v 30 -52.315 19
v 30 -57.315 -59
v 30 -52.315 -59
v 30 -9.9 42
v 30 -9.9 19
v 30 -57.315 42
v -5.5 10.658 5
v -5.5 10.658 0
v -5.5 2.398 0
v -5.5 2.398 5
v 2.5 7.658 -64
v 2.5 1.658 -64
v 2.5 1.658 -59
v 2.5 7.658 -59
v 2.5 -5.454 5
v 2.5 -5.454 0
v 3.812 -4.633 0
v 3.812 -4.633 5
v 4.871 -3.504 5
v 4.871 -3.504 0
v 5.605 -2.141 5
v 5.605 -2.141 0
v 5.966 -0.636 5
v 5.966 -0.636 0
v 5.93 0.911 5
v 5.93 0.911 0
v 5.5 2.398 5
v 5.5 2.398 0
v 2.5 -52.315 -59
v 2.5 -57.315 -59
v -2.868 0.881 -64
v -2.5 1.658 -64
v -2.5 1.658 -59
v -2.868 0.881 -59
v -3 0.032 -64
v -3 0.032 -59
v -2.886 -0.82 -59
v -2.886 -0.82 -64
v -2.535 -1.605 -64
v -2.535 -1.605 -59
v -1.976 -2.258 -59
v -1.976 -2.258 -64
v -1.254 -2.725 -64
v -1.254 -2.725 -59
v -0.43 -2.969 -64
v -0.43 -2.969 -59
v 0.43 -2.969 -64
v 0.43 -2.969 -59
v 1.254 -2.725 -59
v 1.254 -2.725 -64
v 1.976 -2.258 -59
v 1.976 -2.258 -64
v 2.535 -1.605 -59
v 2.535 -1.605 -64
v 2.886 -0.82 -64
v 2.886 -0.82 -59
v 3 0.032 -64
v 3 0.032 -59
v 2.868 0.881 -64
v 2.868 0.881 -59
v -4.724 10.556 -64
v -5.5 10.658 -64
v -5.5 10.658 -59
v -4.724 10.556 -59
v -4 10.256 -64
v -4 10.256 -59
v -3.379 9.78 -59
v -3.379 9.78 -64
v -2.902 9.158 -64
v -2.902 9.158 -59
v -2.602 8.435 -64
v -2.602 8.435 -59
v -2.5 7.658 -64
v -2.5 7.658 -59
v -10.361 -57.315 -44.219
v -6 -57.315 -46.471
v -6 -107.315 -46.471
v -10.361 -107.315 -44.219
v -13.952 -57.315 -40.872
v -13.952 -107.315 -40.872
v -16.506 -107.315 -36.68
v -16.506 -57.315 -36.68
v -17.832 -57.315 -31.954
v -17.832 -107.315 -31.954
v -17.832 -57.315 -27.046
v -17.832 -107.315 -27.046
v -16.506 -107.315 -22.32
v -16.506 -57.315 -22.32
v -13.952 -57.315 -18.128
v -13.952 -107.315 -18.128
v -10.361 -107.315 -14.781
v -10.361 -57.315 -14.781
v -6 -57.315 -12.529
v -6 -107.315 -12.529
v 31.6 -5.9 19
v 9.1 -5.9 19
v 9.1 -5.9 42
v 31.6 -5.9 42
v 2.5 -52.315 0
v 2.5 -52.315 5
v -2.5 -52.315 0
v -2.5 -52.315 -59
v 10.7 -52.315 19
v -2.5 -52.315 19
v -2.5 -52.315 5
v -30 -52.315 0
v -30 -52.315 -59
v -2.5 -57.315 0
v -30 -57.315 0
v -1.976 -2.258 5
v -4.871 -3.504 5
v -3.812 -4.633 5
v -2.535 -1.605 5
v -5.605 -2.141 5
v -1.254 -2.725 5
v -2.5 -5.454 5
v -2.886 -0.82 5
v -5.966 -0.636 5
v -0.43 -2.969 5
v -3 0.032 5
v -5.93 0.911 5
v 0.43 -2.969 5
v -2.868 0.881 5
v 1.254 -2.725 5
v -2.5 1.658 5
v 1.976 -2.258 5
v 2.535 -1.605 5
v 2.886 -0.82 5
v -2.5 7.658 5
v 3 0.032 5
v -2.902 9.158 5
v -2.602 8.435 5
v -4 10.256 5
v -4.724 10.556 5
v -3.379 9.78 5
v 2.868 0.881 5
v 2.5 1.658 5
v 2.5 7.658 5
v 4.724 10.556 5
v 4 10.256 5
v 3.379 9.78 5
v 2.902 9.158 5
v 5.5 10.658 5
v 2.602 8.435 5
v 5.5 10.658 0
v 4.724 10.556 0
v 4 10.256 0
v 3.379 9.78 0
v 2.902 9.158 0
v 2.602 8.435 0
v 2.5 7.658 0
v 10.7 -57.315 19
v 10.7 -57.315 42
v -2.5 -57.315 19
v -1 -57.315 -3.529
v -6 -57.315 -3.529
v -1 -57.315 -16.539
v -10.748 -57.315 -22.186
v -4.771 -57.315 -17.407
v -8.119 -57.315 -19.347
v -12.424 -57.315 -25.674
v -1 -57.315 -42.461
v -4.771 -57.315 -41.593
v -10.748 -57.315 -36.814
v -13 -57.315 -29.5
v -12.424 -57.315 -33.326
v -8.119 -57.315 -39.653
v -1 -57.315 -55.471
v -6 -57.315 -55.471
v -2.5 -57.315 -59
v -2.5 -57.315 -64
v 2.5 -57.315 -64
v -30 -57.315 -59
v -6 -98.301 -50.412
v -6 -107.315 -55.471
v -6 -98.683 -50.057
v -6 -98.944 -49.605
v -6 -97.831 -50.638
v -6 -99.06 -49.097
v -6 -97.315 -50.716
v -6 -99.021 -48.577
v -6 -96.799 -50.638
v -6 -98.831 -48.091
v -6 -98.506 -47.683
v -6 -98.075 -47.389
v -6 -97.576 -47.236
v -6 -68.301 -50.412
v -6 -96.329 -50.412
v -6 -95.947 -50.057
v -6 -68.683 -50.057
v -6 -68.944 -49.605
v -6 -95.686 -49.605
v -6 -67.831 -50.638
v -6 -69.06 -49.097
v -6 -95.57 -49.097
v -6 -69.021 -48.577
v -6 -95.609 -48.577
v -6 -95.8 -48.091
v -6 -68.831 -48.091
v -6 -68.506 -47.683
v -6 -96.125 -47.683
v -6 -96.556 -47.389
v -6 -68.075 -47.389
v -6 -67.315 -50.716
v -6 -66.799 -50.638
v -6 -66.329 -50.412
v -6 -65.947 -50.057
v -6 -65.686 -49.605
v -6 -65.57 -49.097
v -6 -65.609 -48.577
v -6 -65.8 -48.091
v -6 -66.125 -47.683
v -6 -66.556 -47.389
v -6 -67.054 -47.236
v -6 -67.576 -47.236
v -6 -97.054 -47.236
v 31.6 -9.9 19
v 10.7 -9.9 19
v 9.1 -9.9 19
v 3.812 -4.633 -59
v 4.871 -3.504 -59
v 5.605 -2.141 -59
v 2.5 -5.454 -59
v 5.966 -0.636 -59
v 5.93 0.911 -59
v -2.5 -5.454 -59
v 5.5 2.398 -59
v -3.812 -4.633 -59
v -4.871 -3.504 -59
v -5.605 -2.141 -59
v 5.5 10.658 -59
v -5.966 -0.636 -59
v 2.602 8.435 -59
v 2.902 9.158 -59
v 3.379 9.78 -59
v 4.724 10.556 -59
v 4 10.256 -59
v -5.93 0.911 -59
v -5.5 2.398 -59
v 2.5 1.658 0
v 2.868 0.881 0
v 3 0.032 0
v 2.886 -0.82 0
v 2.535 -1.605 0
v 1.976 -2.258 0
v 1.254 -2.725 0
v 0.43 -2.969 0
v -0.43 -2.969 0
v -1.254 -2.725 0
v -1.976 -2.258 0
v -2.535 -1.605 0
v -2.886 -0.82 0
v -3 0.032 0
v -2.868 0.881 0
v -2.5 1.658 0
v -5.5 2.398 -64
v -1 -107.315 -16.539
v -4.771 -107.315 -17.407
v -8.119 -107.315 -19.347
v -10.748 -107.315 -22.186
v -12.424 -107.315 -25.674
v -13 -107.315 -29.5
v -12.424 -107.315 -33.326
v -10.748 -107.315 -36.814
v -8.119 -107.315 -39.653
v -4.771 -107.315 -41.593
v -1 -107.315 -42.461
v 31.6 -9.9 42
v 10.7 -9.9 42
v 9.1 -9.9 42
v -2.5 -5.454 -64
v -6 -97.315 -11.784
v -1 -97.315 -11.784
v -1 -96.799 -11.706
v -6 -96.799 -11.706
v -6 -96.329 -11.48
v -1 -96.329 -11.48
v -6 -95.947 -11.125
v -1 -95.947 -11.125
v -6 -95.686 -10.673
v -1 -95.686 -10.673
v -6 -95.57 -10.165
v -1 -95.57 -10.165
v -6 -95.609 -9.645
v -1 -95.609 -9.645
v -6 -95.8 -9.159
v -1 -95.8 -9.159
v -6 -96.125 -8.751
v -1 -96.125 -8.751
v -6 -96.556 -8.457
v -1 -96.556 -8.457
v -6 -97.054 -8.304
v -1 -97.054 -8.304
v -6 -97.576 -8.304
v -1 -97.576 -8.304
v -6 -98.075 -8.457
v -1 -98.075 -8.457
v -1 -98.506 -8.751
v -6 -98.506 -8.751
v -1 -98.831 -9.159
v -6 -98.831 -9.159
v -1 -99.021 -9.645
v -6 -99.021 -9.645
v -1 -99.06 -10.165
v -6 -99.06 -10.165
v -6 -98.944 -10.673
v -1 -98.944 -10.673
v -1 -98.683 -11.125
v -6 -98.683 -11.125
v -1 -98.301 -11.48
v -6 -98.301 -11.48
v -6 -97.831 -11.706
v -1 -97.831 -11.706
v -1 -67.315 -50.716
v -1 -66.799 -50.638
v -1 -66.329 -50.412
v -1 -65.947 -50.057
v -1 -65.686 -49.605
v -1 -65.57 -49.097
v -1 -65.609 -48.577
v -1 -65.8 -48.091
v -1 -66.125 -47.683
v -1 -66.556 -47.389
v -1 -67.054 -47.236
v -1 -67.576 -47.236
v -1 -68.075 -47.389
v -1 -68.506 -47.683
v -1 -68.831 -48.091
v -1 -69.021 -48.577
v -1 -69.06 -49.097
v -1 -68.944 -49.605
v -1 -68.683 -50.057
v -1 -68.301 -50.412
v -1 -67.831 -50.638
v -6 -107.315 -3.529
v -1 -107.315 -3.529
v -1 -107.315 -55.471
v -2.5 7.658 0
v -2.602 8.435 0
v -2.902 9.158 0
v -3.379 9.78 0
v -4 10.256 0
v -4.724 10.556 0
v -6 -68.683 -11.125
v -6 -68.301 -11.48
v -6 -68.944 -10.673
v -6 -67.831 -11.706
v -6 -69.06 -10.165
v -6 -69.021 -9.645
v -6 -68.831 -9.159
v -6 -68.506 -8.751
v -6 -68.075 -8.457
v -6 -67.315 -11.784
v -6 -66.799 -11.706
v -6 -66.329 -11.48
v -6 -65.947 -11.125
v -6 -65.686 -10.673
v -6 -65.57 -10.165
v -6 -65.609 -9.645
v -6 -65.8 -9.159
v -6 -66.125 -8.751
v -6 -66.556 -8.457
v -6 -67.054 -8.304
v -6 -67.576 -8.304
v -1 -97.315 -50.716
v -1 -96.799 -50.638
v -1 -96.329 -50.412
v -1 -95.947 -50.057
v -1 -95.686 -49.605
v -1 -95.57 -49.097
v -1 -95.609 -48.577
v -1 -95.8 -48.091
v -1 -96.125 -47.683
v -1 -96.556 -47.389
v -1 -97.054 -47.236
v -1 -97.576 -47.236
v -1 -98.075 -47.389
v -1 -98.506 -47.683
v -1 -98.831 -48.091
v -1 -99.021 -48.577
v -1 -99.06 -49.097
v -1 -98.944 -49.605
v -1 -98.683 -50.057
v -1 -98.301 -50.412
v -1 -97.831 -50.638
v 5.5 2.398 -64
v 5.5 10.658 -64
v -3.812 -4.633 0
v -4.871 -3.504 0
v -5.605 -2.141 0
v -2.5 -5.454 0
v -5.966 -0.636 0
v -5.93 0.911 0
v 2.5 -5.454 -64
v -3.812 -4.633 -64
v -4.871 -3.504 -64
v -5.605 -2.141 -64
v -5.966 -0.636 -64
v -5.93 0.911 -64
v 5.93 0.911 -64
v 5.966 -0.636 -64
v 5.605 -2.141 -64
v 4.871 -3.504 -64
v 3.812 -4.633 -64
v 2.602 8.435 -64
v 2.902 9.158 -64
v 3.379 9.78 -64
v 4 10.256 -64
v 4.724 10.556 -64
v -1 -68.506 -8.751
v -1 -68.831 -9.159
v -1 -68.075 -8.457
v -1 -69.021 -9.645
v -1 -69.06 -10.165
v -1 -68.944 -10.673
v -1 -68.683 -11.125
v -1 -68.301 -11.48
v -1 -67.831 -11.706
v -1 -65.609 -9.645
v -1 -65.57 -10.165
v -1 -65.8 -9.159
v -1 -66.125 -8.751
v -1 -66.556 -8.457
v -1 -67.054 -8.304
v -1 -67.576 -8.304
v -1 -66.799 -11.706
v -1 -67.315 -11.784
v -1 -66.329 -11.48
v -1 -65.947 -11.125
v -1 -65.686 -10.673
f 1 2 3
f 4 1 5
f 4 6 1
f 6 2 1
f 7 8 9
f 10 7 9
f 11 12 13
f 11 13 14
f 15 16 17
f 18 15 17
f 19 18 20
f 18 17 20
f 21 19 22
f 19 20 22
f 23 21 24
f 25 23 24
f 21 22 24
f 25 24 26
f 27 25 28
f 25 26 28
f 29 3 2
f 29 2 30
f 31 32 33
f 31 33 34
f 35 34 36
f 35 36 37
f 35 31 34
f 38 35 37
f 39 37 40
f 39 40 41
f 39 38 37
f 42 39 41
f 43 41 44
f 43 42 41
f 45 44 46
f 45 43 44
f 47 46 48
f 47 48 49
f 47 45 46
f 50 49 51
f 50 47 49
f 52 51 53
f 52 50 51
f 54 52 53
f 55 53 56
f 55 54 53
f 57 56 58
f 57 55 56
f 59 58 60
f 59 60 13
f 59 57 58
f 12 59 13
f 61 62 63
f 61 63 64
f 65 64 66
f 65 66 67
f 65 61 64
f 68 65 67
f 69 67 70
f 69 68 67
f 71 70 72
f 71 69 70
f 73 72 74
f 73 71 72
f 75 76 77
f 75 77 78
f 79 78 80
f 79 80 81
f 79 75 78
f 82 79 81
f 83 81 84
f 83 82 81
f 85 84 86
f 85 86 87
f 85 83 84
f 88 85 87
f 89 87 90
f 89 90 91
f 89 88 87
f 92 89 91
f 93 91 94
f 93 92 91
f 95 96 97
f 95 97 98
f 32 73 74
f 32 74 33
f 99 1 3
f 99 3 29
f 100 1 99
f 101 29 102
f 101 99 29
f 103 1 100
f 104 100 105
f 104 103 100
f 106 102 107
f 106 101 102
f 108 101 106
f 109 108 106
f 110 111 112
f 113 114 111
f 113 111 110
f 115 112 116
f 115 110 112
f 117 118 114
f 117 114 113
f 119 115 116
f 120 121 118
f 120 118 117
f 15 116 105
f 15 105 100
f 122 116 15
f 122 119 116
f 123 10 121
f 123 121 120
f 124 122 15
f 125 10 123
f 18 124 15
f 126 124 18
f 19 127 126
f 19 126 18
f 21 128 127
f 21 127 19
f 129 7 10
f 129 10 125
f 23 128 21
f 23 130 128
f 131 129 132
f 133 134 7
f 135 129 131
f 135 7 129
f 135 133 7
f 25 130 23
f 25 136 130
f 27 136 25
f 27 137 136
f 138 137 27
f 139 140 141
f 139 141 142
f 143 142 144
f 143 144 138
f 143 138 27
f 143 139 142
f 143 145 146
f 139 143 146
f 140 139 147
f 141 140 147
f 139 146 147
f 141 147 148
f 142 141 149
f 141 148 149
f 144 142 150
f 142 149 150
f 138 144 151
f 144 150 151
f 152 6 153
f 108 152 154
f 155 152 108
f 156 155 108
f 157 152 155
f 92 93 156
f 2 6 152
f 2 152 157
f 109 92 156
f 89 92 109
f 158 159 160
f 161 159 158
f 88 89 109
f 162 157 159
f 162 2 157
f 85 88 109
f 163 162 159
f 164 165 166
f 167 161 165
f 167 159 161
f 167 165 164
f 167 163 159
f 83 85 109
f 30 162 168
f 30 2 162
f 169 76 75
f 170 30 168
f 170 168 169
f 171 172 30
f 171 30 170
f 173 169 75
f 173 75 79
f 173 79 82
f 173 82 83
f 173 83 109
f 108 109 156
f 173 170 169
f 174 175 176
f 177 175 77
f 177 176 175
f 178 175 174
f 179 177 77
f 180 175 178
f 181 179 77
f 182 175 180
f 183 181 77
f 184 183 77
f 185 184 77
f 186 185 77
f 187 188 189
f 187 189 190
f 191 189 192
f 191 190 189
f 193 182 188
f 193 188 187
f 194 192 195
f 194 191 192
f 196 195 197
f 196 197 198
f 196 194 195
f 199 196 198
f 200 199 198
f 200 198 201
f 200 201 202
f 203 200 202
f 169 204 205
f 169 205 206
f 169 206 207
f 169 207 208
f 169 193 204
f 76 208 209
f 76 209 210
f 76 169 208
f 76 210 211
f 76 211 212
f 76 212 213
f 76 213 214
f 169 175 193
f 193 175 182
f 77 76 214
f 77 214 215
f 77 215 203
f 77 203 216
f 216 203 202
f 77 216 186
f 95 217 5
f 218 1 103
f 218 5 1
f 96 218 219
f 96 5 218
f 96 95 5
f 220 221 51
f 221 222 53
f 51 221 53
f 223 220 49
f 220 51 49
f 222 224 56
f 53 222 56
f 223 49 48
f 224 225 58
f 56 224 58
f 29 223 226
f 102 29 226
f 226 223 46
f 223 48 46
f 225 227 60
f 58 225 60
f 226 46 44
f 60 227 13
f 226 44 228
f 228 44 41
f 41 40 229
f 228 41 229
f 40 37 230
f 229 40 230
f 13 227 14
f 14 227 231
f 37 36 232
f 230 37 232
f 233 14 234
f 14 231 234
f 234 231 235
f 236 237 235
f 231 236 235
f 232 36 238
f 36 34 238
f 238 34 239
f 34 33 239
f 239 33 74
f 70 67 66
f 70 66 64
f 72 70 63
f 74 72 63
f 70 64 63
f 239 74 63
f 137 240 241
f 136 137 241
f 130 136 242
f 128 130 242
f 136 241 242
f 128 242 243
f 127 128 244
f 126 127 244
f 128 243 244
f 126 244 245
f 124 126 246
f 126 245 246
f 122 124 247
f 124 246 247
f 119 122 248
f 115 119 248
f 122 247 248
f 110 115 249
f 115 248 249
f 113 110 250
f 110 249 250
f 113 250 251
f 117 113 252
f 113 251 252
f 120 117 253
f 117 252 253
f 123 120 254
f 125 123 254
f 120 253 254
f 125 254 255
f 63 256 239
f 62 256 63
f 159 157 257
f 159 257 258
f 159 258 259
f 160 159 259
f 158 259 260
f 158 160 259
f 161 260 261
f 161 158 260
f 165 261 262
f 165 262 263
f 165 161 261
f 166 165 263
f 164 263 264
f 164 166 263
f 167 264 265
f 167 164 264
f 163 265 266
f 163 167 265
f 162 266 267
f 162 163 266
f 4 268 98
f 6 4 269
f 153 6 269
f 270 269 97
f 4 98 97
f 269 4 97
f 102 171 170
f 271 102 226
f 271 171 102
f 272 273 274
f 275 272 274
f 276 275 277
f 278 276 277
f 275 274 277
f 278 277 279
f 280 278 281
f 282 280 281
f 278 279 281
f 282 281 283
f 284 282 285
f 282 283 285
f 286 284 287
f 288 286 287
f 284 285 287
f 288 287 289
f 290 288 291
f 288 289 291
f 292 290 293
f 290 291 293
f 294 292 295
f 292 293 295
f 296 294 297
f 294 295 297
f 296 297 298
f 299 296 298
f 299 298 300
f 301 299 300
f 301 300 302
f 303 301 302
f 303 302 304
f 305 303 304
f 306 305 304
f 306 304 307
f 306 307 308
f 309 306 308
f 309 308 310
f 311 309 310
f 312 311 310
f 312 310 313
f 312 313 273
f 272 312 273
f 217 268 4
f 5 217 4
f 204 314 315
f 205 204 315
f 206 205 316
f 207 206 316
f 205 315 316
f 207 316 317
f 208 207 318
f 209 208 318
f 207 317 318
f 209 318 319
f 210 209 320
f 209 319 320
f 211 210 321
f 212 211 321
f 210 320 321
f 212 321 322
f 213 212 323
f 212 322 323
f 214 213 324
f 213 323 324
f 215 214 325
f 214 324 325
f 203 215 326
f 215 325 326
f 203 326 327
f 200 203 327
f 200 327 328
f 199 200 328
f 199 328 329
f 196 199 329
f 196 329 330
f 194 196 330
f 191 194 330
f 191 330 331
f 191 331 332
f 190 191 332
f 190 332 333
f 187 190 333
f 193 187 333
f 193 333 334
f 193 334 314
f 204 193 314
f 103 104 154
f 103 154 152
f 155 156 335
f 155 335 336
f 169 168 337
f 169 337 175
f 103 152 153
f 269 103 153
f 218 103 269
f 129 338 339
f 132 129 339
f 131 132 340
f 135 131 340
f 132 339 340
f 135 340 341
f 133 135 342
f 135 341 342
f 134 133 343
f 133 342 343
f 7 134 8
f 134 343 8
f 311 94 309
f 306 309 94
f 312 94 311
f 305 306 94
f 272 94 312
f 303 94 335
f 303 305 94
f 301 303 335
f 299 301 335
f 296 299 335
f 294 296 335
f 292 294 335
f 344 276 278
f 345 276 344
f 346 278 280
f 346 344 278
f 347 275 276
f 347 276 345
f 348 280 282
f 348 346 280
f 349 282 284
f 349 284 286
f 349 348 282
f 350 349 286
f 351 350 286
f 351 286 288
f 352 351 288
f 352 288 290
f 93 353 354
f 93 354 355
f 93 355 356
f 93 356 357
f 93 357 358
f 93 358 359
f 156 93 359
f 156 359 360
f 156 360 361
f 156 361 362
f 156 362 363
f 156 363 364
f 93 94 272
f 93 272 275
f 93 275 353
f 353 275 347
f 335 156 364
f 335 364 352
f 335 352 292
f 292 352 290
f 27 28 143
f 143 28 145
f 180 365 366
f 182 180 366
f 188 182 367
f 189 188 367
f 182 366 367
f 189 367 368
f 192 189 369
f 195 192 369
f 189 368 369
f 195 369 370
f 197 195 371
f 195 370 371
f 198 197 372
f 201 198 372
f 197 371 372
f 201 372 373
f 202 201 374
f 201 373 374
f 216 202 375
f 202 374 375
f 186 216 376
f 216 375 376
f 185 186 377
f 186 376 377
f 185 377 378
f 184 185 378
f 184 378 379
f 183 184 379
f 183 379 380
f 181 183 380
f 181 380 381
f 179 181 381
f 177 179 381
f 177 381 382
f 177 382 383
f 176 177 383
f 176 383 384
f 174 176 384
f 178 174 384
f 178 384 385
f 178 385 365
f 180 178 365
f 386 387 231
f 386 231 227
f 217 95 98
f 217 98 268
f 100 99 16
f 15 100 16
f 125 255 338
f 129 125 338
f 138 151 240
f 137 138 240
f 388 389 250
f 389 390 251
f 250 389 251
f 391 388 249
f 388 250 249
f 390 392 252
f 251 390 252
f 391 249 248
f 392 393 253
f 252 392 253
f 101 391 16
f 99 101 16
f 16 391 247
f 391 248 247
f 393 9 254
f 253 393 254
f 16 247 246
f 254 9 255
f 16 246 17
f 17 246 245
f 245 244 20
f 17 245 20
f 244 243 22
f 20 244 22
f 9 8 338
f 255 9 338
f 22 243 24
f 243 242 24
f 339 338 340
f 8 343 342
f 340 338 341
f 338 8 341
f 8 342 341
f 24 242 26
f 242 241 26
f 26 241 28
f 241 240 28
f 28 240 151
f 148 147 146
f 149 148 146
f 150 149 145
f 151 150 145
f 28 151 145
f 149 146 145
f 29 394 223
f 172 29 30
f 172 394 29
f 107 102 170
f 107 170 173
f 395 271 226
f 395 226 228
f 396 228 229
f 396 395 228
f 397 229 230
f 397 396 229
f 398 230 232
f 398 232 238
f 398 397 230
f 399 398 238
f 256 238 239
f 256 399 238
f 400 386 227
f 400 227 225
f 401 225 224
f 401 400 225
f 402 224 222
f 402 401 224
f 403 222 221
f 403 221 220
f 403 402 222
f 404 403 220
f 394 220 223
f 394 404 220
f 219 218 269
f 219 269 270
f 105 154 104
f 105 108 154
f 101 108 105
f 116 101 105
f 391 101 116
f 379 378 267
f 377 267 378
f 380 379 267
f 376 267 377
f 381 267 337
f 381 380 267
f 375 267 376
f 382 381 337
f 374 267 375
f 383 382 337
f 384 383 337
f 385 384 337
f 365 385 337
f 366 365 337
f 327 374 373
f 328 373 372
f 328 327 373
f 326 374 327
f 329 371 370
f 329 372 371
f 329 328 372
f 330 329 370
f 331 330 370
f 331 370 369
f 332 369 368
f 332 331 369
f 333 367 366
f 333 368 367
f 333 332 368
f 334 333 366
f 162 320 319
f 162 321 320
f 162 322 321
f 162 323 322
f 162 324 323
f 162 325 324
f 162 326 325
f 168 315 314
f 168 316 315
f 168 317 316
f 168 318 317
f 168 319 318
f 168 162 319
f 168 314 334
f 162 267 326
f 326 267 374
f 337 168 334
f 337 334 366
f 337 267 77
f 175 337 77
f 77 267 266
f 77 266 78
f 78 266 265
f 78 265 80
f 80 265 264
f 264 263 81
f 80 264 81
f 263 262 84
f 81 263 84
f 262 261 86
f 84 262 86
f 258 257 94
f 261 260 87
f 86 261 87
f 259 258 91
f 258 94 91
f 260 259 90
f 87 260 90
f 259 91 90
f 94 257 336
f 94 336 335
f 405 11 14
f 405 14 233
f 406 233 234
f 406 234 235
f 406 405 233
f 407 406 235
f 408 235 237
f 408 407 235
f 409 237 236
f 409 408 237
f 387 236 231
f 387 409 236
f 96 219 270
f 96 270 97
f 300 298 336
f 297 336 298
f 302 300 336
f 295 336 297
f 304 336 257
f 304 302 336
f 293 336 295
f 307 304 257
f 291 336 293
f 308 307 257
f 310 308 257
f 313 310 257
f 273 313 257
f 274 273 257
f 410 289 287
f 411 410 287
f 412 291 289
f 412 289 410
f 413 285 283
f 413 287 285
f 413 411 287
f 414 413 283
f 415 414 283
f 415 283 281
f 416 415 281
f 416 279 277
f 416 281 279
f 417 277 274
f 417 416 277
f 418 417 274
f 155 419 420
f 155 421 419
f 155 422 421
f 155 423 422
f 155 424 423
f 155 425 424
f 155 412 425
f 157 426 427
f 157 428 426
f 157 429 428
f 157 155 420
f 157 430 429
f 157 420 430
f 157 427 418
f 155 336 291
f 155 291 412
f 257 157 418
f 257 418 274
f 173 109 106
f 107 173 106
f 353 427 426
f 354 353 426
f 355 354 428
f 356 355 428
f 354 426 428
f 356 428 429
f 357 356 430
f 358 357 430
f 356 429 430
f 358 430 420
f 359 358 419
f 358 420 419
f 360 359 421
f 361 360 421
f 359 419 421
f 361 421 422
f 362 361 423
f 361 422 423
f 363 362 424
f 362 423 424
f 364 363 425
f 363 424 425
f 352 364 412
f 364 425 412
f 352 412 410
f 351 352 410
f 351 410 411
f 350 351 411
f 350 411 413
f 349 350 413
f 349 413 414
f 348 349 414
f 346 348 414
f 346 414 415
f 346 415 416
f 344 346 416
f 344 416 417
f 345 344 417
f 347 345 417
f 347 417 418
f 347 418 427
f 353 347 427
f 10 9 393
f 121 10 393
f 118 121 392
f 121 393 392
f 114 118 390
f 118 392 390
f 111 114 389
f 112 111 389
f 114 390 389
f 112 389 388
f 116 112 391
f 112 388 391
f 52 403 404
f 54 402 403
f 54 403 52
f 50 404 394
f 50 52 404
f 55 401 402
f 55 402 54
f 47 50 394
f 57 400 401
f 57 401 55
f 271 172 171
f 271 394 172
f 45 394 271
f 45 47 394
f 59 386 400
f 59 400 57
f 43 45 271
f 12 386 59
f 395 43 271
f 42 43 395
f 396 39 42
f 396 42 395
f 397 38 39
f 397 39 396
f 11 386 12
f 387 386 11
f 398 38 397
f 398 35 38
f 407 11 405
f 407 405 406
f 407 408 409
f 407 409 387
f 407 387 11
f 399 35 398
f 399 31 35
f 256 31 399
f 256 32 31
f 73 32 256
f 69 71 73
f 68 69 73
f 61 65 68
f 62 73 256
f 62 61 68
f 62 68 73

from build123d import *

# Parameters (mm, degrees)
BOSS_EXTRUDE1_DEPTH = 5
SKETCH2_W           = 32.5
SKETCH2_H           = 5
BOSS_EXTRUDE2_DEPTH = 14
BOSS_EXTRUDE3_DEPTH = 23
SKETCH4_W           = 60
SKETCH4_H           = 5
BOSS_EXTRUDE4_DEPTH = 59
BOSS_EXTRUDE5_START = 5
BOSS_EXTRUDE5_DEPTH = 5
BOSS_EXTRUDE6_DEPTH = 50
SKETCH7_R           = 1.75
CUT_EXTRUDE1_DEPTH  = 130.133002576


with BuildPart() as part:
    # Sketch1 → Boss-Extrude1 (new body)
    with BuildSketch(Plane.XY):
        with BuildLine():
            Line((-2.5, -5.454356057), (-2.5, -57.315294131))
            Line((-2.5, -57.315294131), (30, -57.315294131))
            Line((30, -57.315294131), (30, -52.315294131))
            Line((30, -52.315294131), (2.5, -52.315294131))
            Line((2.5, -52.315294131), (2.5, -5.454356057))
            ThreePointArc((2.5, -5.454356057), (5.604867811, -2.141367979), (5.5, 2.397915762))
            Line((5.5, 2.397915762), (5.5, 10.658312395))
            ThreePointArc((5.5, 10.658312395), (3.378679656, 9.779632739), (2.5, 7.658312395))
            Line((2.5, 7.658312395), (2.5, 1.658312395))
            ThreePointArc((2.5, 1.658312395), (0, -3), (-2.5, 1.658312395))
            Line((-2.5, 1.658312395), (-2.5, 7.658312395))
            ThreePointArc((-2.5, 7.658312395), (-3.378679656, 9.779632739), (-5.5, 10.658312395))
            Line((-5.5, 10.658312395), (-5.5, 2.397915762))
            ThreePointArc((-5.5, 2.397915762), (-5.604867811, -2.141367979), (-2.5, -5.454356057))
        make_face()
    extrude(amount=BOSS_EXTRUDE1_DEPTH)

    # Sketch2 → Boss-Extrude2 (add)
    with BuildSketch(Plane.XY.offset(5)):
        with Locations((13.75, -54.815294131)):
            Rectangle(SKETCH2_W, SKETCH2_H)
    extrude(amount=BOSS_EXTRUDE2_DEPTH)

    # Sketch3 → Boss-Extrude3 (add)
    with BuildSketch(Plane.XY.offset(19)):
        Polygon((10.7, -57.315294131), (10.7, -9.9), (9.1, -9.9), (9.1, -5.9), (31.6, -5.9), (31.6, -9.9), (30, -9.9), (30, -57.315294131), align=None)
    extrude(amount=BOSS_EXTRUDE3_DEPTH)

    # Sketch4 → Boss-Extrude4 (add)
    with BuildSketch(Plane(origin=(0, 0, 0), x_dir=(-1, 0, 0), z_dir=(0, 0, -1))):
        with Locations((0, -54.815294131)):
            Rectangle(SKETCH4_W, SKETCH4_H)
    extrude(amount=BOSS_EXTRUDE4_DEPTH)

    # Sketch5 → Boss-Extrude5 (add)
    with BuildSketch(Plane(origin=(0, 0, -59), x_dir=(-1, 0, 0), z_dir=(0, 0, -1)).offset(BOSS_EXTRUDE5_START)):
        with BuildLine():
            Line((-2.5, -57.315294131), (2.5, -57.315294131))
            Line((2.5, -57.315294131), (2.5, -5.454356057))
            ThreePointArc((2.5, -5.454356057), (5.604867811, -2.141367979), (5.5, 2.397915762))
            Line((5.5, 2.397915762), (5.5, 10.658312395))
            ThreePointArc((5.5, 10.658312395), (3.378679656, 9.779632739), (2.5, 7.658312395))
            Line((2.5, 7.658312395), (2.5, 1.658312395))
            ThreePointArc((2.5, 1.658312395), (0, -3), (-2.5, 1.658312395))
            Line((-2.5, 1.658312395), (-2.5, 7.658312395))
            ThreePointArc((-2.5, 7.658312395), (-3.378679656, 9.779632739), (-5.5, 10.658312395))
            Line((-5.5, 10.658312395), (-5.5, 2.397915762))
            ThreePointArc((-5.5, 2.397915762), (-5.604867811, -2.141367979), (-2.5, -5.454356057))
            Line((-2.5, -5.454356057), (-2.5, -57.315294131))
        make_face()
    extrude(amount=-BOSS_EXTRUDE5_DEPTH)

    # Sketch6 → Boss-Extrude6 (add)
    with BuildSketch(Plane.XZ.offset(57.315294131)):
        with BuildLine():
            Line((-1, -3.529437252), (-1, -16.538518603))
            ThreePointArc((-1, -16.538518603), (-13, -29.5), (-1, -42.461481397))
            Line((-1, -42.461481397), (-1, -55.470562748))
            Line((-1, -55.470562748), (-6, -55.470562748))
            Line((-6, -55.470562748), (-6, -46.470562748))
            ThreePointArc((-6, -46.470562748), (-18, -29.5), (-6, -12.529437252))
            Line((-6, -12.529437252), (-6, -3.529437252))
            Line((-6, -3.529437252), (-1, -3.529437252))
        make_face()
    extrude(amount=BOSS_EXTRUDE6_DEPTH)

    # Sketch7 → Cut-Extrude1 (cut, through all)
    with BuildSketch(Plane(origin=(-1, 0, 0), x_dir=(0, 0, -1), z_dir=(1, 0, 0))):
        with Locations((10.033977927, -67.315294131)):
            Circle(SKETCH7_R)
        with Locations((10.033977927, -97.315294131)):
            Circle(SKETCH7_R)
        with Locations((48.966022073, -97.315294131)):
            Circle(SKETCH7_R)
        with Locations((48.966022073, -67.315294131)):
            Circle(SKETCH7_R)
    extrude(amount=-CUT_EXTRUDE1_DEPTH, mode=Mode.SUBTRACT)


solid = part.part
